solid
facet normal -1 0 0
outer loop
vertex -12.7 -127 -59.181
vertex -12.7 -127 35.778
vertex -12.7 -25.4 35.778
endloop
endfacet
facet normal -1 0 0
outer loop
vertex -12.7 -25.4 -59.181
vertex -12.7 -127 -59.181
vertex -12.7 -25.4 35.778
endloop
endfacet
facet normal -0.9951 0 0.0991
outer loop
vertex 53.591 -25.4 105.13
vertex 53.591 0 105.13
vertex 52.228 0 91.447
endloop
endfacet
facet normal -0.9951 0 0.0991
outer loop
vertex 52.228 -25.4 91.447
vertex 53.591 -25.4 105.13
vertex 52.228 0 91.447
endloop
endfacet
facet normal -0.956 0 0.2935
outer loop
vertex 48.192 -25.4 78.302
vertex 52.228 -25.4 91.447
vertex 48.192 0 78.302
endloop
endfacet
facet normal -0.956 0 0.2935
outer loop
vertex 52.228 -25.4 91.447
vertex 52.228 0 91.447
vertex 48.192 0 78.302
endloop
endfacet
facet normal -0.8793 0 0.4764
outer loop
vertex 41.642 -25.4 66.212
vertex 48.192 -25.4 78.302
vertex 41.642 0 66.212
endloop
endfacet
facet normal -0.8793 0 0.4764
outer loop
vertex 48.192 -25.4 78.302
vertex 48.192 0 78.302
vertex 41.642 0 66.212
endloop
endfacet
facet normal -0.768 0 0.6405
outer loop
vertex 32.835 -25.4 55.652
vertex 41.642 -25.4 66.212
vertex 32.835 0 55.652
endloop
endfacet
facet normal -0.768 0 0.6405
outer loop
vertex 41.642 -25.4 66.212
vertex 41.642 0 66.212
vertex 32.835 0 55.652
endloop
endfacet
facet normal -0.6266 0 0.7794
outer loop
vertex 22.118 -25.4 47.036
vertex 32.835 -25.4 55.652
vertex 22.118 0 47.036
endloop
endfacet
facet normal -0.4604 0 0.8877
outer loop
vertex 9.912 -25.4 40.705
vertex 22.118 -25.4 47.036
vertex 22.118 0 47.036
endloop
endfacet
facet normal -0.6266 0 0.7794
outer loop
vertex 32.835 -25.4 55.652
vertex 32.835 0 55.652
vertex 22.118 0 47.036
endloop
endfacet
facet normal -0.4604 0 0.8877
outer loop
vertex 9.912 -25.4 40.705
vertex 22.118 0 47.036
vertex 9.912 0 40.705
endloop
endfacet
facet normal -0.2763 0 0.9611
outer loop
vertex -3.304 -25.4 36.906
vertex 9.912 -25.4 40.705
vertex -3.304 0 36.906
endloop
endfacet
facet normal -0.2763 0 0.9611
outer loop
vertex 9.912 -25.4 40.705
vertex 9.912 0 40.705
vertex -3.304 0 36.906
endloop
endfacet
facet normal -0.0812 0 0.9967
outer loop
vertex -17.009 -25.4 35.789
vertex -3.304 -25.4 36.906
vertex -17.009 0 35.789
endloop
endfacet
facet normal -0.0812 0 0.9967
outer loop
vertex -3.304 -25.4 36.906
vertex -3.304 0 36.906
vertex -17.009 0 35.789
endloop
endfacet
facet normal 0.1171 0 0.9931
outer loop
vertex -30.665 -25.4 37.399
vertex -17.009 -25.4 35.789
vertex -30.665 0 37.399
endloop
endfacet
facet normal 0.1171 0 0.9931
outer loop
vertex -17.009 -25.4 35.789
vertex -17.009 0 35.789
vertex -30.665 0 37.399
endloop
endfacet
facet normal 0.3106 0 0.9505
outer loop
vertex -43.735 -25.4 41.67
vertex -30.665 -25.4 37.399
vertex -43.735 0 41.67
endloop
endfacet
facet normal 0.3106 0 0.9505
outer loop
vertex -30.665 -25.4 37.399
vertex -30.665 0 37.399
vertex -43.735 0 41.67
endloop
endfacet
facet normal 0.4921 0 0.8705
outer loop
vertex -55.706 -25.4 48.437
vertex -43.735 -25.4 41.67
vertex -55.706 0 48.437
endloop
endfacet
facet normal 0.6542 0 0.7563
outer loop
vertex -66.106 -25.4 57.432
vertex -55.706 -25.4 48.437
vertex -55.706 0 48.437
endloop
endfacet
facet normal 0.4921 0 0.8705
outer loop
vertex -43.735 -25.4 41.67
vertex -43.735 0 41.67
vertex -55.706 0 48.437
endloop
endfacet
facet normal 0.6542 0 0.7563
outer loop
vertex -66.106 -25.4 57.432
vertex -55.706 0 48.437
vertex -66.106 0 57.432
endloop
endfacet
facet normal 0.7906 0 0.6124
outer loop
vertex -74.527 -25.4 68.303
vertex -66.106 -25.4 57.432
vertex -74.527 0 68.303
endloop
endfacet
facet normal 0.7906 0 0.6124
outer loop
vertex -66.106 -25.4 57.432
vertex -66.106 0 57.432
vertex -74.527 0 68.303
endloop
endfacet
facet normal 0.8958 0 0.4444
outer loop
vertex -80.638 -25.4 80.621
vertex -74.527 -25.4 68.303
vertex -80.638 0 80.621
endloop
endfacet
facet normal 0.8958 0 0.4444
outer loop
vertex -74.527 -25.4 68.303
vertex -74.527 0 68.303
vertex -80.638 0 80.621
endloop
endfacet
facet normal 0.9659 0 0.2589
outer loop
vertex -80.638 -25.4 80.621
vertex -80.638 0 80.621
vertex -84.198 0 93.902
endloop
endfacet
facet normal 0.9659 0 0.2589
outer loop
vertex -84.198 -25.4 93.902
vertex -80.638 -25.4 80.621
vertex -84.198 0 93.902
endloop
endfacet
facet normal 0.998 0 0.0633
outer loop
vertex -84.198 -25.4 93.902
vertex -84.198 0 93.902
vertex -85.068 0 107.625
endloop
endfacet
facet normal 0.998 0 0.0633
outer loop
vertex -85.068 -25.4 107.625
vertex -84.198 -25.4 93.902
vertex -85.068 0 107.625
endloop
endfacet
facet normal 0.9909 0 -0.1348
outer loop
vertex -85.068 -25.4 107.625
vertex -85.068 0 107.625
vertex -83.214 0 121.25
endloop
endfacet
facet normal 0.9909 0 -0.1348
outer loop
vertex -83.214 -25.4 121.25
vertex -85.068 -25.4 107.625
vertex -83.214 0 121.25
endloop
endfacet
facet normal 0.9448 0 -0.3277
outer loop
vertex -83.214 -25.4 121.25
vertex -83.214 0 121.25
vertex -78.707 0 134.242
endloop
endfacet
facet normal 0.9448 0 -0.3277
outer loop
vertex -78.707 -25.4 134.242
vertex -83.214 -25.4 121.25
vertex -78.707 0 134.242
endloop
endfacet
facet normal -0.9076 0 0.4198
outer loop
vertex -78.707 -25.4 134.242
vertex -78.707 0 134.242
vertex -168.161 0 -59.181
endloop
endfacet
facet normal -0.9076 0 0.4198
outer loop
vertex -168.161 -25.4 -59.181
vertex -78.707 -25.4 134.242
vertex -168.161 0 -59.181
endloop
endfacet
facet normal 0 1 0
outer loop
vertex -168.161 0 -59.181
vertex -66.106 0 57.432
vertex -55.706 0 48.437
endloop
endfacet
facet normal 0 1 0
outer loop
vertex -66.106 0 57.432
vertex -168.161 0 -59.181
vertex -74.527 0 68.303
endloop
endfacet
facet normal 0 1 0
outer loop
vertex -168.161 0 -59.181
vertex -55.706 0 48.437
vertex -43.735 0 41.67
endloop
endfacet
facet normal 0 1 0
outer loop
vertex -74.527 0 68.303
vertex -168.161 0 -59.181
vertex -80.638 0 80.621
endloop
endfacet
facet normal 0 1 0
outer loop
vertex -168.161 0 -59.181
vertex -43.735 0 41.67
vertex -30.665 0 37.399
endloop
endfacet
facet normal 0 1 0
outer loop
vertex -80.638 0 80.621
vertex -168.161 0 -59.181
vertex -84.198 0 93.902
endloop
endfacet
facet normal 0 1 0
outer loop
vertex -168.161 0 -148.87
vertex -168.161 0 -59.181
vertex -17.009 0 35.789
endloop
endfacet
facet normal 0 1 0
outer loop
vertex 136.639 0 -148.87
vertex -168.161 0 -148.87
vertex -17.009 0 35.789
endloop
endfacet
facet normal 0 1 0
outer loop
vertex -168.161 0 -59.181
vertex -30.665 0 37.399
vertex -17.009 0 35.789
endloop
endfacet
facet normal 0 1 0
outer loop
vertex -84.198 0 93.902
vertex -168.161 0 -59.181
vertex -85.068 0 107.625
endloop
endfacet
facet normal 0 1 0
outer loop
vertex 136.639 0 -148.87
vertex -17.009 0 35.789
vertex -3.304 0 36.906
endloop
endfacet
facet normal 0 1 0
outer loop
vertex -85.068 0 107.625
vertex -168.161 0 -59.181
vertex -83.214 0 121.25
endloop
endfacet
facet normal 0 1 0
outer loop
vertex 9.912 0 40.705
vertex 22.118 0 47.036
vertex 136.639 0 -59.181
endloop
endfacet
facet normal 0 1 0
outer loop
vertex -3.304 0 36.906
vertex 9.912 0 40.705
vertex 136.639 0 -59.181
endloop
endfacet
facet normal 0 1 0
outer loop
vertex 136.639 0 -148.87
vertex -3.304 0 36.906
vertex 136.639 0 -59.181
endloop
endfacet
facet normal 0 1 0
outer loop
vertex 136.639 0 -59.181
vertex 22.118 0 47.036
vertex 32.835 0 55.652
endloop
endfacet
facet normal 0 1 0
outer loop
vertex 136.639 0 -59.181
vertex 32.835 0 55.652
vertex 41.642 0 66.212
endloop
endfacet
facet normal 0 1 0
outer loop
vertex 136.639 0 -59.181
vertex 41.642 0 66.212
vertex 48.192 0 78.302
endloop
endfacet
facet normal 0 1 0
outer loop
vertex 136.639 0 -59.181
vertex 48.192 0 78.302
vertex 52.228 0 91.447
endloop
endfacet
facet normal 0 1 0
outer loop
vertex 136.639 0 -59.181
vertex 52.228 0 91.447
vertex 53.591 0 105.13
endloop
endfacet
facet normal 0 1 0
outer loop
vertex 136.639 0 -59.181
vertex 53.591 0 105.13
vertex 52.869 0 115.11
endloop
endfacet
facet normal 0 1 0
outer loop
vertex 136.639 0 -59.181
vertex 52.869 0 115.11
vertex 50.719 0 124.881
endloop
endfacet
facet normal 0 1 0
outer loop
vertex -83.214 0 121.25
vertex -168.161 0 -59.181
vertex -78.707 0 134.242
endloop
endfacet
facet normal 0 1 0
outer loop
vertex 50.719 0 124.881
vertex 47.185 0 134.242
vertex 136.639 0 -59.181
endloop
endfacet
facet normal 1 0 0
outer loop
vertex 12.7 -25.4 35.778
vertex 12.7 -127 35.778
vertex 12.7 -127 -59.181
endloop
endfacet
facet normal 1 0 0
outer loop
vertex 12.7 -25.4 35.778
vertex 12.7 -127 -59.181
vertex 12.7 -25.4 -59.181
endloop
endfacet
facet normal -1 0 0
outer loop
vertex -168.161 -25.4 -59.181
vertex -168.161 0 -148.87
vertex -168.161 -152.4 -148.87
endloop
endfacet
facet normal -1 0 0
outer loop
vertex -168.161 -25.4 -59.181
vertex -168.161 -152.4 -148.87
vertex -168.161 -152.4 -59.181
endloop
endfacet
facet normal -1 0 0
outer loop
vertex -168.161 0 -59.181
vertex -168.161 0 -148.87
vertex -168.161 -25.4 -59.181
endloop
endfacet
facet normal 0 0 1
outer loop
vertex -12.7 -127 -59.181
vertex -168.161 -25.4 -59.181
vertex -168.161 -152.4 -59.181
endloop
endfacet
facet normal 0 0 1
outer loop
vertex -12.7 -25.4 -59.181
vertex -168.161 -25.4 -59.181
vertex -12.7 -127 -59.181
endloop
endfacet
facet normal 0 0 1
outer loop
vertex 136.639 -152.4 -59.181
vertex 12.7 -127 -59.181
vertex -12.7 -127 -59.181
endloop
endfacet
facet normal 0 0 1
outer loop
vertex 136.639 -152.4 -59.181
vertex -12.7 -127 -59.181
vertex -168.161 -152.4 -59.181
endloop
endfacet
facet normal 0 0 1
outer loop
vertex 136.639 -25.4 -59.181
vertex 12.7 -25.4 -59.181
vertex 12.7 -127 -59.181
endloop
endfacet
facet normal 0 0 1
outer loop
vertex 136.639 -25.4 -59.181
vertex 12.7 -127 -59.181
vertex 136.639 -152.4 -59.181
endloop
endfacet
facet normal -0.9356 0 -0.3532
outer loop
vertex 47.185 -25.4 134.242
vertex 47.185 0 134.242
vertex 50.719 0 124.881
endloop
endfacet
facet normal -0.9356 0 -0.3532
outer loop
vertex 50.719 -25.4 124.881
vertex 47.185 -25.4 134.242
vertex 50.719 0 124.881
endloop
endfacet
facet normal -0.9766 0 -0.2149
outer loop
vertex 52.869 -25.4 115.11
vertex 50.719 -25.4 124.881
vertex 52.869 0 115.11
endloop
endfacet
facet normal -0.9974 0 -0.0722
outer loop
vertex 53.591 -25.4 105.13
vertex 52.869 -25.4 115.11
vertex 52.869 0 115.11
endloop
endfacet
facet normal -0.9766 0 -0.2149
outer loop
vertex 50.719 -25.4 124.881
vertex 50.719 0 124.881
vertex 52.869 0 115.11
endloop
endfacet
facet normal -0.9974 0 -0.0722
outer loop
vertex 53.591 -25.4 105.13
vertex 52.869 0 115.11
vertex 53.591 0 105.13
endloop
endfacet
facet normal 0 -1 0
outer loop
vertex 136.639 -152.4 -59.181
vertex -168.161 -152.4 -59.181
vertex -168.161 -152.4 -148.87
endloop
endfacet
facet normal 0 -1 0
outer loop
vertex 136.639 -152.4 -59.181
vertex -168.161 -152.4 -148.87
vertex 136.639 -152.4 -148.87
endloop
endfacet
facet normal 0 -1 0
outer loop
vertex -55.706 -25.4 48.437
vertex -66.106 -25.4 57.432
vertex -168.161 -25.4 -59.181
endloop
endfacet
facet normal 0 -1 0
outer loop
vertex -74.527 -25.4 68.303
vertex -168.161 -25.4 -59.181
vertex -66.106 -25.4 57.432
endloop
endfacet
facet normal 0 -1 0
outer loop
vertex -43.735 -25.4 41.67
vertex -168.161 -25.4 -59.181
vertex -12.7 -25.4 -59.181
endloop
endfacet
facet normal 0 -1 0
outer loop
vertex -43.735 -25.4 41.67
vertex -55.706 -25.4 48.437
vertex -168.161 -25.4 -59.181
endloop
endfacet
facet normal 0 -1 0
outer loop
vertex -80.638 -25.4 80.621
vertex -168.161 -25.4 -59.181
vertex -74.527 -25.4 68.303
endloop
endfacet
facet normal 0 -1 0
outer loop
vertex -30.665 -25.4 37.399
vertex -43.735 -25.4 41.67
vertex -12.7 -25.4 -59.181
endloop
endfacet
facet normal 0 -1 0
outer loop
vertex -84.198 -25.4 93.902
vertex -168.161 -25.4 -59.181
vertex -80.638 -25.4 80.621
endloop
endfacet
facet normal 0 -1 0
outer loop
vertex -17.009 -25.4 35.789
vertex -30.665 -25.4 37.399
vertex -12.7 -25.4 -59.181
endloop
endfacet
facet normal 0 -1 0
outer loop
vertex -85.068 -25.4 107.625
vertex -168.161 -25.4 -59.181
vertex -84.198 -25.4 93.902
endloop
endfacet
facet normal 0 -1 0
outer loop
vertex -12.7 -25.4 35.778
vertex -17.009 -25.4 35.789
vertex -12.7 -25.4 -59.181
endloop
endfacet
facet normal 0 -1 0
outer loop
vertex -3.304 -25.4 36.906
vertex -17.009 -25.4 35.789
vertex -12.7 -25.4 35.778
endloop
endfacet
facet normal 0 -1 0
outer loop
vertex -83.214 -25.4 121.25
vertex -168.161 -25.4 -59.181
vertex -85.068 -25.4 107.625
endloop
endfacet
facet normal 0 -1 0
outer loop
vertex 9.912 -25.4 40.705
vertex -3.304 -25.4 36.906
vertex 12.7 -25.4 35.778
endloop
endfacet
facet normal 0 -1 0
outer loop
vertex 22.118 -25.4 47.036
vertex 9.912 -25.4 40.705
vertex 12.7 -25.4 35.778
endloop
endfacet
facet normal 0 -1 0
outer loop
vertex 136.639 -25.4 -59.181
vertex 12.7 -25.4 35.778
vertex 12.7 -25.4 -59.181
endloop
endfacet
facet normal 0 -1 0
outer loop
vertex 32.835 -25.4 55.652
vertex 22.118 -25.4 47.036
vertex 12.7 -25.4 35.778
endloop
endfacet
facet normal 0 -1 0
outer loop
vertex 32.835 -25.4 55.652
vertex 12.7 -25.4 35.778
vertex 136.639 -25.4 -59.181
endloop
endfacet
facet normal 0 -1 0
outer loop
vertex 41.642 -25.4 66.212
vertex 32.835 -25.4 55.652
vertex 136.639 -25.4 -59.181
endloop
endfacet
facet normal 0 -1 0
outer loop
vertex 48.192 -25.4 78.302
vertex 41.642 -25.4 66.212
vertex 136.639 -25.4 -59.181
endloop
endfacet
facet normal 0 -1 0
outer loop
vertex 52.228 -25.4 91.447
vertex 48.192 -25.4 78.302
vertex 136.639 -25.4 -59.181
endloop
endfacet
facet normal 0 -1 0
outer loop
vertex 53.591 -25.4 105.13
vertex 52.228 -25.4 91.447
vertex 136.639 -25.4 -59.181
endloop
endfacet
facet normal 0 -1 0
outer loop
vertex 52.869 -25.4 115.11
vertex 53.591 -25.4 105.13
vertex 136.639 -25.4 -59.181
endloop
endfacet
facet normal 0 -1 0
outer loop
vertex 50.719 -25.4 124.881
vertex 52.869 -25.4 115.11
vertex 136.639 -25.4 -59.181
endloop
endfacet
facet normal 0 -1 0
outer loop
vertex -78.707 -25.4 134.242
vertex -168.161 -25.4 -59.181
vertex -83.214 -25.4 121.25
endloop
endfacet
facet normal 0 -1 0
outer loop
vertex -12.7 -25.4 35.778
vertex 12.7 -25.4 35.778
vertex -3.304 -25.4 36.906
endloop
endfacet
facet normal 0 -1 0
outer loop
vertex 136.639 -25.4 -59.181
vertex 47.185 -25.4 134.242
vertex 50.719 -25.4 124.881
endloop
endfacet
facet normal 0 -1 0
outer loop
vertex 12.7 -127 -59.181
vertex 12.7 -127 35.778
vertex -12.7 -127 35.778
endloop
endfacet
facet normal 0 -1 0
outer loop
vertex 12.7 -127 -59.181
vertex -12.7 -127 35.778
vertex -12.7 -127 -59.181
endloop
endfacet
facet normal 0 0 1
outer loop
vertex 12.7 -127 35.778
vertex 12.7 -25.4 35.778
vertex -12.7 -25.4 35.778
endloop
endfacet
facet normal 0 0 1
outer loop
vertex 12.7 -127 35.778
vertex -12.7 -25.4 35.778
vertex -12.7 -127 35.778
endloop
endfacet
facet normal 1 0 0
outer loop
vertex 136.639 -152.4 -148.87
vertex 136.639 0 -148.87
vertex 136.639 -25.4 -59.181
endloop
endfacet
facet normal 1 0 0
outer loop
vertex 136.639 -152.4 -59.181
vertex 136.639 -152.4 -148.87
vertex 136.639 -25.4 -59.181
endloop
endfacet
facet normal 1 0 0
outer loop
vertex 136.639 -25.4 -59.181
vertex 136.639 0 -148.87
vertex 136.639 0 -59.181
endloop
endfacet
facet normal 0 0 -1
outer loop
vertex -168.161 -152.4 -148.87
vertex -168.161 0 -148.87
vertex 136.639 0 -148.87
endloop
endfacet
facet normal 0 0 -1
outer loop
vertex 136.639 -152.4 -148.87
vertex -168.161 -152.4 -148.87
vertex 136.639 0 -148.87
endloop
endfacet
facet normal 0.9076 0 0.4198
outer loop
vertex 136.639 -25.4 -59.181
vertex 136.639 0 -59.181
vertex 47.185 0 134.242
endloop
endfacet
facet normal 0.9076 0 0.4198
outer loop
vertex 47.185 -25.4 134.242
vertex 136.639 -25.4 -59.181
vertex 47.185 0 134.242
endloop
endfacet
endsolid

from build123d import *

# Parameters (mm, degrees)
F0_W     = 304.8
F0_H     = 89.688896
F1_DEPTH = 152.4
F2_DEPTH = 25.4
F4_DEPTH = 12.7


with BuildPart() as f1:
    # F0 (on Front) → F1 (new body)
    with BuildSketch(Plane.XZ):
        with Locations((-15.761086, -104.025281)):
            Rectangle(F0_W, F0_H)
    extrude(amount=F1_DEPTH)

    # F0 (on Front) → F2 (join)
    with BuildSketch(Plane.XZ):
        with BuildLine():
            Line((-78.707459, 134.241588), (-168.161086, -59.180833))
            Line((-168.161086, -59.180833), (136.638914, -59.180833))
            Line((136.638914, -59.180833), (47.185288, 134.241588))
            ThreePointArc((47.185288, 134.241588), (51.970658, 120.034148), (53.591021, 105.130271))
            ThreePointArc((53.591021, 105.130271), (-30.664962, 37.398527), (-78.707459, 134.241588))
        make_face()
    extrude(amount=F2_DEPTH)

    # F3 (on Right) → F4 (join, symmetric)
    with BuildSketch(Plane.YZ):
        Polygon((-23.240424, -61.891118), (-25.4, 35.778165), (-127, 35.778165), (-127, -61.891118), align=None)
    extrude(amount=F4_DEPTH, both=True)


solid = f1.part
